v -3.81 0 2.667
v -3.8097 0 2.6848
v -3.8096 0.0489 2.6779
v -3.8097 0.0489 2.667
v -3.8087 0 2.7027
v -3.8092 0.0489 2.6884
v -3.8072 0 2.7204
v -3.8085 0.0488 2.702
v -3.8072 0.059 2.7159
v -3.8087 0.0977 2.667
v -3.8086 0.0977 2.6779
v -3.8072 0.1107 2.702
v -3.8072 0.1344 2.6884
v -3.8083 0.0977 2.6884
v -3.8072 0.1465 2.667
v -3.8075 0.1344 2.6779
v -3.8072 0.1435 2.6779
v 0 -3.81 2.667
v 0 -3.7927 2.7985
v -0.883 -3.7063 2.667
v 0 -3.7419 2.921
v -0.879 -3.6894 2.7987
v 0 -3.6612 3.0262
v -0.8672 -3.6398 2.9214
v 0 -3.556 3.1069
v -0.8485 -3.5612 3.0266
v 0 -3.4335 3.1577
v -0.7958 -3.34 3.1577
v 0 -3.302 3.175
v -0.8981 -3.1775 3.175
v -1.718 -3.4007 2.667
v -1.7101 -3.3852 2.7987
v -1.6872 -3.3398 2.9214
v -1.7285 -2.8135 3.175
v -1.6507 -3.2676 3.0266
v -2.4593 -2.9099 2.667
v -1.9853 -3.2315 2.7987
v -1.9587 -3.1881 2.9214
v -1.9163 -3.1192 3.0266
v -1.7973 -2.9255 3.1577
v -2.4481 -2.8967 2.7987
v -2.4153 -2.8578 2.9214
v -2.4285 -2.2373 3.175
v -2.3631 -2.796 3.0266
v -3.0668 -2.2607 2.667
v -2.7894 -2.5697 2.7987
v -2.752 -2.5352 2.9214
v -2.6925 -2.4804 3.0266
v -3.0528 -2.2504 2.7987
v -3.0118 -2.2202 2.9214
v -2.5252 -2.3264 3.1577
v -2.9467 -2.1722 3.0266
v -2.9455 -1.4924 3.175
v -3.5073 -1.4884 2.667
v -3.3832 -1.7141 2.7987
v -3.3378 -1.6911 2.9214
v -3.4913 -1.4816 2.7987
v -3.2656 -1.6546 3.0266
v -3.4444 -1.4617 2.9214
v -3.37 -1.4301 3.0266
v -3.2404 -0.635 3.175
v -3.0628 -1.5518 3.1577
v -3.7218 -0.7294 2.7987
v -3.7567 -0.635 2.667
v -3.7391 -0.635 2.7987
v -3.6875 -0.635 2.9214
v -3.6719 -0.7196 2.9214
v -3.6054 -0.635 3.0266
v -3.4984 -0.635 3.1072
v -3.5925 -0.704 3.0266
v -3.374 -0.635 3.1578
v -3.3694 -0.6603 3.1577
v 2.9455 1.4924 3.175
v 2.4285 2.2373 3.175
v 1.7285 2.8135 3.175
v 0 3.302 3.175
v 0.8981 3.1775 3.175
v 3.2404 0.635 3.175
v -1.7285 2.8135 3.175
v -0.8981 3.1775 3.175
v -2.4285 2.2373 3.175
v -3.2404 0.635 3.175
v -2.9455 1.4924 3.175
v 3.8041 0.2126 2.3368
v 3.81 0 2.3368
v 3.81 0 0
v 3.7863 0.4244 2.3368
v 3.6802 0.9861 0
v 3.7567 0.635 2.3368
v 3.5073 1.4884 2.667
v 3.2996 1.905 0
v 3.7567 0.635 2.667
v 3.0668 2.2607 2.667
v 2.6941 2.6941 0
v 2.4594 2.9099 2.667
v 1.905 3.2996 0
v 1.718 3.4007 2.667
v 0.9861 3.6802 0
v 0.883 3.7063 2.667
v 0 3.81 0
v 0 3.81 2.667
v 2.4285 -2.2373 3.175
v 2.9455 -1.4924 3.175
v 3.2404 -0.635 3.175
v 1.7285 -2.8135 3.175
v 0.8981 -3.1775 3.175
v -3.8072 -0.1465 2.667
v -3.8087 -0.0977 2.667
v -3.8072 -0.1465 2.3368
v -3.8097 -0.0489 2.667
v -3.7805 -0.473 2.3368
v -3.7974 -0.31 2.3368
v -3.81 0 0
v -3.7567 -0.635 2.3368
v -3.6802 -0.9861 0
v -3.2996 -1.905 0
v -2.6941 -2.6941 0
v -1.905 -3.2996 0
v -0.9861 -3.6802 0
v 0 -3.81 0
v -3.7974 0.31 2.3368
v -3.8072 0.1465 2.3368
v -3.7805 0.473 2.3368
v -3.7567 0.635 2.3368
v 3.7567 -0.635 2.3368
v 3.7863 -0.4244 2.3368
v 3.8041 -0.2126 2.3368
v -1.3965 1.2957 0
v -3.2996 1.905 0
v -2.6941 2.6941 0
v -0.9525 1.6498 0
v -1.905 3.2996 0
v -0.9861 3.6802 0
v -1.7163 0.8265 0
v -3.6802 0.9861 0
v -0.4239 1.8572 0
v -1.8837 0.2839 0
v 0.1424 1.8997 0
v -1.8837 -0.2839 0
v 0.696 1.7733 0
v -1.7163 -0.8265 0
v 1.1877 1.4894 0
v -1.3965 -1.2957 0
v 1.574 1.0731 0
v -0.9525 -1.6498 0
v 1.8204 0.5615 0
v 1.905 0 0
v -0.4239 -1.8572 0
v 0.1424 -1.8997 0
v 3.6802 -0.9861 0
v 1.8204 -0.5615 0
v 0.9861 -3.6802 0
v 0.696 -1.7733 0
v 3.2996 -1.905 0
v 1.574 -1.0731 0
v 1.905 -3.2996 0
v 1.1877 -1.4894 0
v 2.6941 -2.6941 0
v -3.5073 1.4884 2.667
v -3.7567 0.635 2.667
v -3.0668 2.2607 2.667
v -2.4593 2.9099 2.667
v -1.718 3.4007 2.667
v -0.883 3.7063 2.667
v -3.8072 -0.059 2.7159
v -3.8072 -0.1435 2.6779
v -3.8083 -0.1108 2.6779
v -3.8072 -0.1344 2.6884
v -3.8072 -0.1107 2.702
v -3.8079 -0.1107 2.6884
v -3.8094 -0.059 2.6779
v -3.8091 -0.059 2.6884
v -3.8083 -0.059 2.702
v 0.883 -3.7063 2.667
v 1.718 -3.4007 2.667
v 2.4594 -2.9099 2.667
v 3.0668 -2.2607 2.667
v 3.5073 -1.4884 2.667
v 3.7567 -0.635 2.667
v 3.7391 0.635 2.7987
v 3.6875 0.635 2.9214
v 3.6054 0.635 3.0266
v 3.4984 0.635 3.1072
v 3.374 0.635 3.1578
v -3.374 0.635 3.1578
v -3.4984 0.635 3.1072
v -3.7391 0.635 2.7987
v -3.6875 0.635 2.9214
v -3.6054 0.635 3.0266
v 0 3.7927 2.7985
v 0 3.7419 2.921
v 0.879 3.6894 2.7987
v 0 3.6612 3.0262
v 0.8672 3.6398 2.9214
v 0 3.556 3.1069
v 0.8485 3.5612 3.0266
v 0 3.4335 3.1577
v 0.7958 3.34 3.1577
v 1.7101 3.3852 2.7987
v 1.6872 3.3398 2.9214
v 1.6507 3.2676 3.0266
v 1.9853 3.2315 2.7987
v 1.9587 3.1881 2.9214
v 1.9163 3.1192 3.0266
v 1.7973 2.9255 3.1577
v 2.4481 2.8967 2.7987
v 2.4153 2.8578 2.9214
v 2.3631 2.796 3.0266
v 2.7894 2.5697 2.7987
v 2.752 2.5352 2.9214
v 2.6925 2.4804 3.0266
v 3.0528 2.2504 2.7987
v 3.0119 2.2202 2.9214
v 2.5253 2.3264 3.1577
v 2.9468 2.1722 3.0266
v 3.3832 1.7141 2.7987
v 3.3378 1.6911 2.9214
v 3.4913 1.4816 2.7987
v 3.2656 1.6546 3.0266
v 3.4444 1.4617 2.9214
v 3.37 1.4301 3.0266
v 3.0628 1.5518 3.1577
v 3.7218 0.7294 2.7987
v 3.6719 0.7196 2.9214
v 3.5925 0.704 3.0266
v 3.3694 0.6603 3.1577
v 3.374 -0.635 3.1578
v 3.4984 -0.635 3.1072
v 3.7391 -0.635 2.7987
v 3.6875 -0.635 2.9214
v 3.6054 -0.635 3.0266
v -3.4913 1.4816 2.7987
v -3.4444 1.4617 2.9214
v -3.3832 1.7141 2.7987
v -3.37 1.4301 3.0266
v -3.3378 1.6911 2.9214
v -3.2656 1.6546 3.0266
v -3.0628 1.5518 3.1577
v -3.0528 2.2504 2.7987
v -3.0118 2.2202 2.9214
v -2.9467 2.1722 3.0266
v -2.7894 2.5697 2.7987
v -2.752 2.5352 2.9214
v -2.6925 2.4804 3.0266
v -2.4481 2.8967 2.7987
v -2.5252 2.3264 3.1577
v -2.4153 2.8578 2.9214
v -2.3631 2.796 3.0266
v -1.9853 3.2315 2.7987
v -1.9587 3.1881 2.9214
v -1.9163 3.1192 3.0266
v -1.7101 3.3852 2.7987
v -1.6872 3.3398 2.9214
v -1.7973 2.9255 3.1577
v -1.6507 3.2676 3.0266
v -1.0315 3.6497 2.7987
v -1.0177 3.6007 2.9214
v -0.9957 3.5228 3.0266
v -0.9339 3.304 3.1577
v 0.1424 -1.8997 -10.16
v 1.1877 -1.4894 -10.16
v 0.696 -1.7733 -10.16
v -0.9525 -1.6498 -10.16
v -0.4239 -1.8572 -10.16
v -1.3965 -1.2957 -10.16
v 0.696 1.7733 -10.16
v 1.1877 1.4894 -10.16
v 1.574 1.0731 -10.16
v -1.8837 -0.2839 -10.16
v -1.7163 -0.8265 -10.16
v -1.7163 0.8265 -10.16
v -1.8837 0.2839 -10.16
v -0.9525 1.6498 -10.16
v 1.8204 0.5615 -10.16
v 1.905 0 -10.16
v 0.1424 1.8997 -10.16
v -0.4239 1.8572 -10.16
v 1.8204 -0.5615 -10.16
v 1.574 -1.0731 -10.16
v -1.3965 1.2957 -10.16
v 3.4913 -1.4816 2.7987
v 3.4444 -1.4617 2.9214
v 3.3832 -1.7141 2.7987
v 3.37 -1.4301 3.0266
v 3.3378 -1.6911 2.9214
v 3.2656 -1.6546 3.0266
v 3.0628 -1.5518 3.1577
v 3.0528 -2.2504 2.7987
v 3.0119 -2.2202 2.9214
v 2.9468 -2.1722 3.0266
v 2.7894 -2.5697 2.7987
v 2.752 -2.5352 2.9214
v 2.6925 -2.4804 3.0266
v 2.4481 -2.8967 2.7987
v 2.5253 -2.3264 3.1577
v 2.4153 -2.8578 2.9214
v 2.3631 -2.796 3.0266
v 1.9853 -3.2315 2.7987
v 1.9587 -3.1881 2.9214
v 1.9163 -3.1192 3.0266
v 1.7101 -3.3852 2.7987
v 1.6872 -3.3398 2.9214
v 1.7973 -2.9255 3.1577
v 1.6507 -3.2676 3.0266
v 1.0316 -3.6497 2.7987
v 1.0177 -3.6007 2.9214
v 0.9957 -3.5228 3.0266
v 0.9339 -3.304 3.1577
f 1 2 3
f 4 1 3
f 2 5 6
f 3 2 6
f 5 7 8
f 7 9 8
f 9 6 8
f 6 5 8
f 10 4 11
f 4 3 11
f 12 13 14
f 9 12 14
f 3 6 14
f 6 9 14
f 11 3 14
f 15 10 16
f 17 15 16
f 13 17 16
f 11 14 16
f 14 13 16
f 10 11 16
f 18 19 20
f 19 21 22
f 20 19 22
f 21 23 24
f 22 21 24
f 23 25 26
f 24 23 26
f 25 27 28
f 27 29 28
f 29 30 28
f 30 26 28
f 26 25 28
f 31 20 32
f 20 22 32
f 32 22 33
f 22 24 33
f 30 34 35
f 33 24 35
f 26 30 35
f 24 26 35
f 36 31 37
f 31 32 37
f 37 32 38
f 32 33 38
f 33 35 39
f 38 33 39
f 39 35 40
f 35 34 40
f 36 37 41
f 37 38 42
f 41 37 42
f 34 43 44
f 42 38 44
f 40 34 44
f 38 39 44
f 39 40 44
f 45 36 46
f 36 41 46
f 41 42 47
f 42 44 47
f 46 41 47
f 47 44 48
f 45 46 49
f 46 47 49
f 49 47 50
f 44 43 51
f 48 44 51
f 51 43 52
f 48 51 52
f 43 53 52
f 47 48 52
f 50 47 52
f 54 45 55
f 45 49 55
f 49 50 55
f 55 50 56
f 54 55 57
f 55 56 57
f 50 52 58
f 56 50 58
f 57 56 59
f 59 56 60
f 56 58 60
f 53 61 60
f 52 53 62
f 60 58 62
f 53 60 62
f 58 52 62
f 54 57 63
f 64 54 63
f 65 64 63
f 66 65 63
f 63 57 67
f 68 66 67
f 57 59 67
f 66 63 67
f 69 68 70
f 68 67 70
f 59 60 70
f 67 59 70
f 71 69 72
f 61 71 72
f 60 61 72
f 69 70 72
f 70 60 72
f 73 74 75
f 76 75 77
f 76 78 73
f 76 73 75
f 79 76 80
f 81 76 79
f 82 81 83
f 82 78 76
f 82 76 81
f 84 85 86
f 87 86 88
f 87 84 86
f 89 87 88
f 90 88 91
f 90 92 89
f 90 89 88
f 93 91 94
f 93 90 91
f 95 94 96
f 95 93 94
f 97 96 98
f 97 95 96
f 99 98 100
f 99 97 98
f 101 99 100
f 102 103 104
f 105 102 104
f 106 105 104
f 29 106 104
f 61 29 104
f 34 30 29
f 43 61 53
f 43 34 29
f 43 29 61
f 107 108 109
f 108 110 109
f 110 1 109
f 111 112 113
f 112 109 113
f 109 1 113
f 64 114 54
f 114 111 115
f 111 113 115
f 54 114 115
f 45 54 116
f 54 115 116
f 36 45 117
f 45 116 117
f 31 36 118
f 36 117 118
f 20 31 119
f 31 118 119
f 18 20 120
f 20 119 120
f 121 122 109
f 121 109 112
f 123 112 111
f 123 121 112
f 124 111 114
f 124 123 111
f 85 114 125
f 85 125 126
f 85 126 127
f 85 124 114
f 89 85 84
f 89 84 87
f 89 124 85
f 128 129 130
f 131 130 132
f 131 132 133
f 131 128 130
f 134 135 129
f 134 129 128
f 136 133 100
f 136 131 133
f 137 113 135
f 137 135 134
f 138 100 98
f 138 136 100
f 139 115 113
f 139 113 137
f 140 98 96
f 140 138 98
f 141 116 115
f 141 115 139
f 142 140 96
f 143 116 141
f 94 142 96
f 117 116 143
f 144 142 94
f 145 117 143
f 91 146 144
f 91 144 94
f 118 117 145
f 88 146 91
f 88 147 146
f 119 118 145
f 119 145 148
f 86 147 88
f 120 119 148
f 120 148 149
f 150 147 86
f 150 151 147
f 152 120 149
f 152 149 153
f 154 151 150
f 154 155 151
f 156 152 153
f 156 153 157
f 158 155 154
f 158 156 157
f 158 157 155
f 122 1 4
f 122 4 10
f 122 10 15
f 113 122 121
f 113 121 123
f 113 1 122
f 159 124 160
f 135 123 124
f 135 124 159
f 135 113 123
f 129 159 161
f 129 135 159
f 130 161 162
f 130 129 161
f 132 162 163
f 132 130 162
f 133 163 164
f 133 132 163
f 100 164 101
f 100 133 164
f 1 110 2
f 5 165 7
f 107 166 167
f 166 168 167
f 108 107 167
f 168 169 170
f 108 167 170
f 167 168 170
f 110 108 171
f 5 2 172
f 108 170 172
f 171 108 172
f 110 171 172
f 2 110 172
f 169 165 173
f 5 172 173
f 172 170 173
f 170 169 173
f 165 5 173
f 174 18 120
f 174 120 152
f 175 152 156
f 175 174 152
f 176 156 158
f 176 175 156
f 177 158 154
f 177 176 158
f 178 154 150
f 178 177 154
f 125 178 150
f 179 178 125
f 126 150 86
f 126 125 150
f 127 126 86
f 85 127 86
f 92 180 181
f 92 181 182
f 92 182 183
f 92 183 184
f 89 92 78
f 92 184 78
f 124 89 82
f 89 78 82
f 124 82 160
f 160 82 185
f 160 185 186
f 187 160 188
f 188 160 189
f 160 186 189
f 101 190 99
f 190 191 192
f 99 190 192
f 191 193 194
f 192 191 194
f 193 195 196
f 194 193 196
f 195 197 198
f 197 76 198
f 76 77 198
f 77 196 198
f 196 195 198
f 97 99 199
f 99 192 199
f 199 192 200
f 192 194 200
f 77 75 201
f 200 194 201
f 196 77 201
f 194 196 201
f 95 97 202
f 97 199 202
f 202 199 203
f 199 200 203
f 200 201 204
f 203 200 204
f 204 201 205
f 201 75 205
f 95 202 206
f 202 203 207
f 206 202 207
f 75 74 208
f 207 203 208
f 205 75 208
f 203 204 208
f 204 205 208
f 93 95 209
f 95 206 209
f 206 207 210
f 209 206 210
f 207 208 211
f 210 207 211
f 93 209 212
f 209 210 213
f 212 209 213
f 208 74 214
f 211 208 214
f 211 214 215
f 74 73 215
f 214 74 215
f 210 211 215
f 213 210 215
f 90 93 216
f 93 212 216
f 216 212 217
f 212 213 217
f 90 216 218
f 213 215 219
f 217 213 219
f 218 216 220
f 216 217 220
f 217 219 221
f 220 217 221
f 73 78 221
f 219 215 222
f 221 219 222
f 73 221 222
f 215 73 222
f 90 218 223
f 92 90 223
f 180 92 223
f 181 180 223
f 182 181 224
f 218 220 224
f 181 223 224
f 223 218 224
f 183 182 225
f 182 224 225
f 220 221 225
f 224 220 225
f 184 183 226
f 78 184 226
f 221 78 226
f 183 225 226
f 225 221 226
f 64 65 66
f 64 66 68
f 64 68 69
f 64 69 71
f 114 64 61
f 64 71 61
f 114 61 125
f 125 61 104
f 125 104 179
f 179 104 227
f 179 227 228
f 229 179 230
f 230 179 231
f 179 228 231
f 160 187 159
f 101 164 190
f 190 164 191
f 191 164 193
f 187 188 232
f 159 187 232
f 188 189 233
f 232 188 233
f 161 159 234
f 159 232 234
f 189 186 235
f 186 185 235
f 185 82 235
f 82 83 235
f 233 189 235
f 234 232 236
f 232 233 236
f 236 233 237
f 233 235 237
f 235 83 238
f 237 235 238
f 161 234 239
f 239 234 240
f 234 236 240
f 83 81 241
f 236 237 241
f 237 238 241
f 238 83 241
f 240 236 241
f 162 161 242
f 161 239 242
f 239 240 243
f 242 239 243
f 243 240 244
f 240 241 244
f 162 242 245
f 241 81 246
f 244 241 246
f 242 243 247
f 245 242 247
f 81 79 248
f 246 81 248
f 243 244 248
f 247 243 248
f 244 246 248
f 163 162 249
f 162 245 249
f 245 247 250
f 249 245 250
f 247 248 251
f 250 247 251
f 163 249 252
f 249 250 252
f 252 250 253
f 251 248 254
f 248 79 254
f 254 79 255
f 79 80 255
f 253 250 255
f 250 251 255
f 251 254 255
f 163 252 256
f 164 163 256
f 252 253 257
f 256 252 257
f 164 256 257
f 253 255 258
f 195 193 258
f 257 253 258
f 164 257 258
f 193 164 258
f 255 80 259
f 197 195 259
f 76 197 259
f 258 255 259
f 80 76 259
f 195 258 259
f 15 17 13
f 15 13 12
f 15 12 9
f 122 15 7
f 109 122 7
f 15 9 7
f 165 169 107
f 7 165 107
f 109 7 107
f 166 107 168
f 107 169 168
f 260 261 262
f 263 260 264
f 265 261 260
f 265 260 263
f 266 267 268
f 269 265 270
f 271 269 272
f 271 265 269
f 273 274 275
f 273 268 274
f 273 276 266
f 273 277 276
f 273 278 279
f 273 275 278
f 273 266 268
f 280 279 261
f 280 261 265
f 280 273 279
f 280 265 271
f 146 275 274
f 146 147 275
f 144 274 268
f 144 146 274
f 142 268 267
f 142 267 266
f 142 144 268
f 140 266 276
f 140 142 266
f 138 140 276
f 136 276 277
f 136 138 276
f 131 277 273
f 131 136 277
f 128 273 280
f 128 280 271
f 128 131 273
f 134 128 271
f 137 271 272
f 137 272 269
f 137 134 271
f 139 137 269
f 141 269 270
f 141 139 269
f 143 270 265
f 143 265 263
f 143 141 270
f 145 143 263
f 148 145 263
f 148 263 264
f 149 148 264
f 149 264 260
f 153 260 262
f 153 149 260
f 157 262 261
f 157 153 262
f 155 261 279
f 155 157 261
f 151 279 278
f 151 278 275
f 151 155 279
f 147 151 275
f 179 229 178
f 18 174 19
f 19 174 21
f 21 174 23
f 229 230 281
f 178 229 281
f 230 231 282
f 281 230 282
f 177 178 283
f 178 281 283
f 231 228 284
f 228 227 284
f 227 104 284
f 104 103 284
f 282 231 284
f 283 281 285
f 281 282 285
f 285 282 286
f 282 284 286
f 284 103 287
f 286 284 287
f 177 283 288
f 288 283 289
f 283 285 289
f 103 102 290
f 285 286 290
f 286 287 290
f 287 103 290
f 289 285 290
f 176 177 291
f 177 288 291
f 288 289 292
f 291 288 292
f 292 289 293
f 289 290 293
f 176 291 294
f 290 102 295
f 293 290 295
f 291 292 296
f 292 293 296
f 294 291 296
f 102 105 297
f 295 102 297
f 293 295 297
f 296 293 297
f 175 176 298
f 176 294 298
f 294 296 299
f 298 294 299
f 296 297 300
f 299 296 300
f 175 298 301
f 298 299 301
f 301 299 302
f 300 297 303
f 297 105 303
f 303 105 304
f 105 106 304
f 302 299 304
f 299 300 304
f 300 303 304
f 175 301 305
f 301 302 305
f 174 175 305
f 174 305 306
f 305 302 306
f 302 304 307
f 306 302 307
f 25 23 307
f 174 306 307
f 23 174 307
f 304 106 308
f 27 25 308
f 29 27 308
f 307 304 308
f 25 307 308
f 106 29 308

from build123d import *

# Parameters (mm, degrees)
F1_DEPTH    = 3.81
F2_T1_DEPTH = 22.225
F3_R        = 3.80999
F0_W        = 1.905
F0_H        = 10.16
F5_R        = 0.508
F7_DEPTH    = 0.8382


# Not quite as in the source:
# - a fillet or chamfer that OpenCascade refuses, or shapes differently, is made with other operations: its cross-section is extruded or revolved along the edge and cut away or added
# - a fillet or chamfer is up to 0.001 mm smaller than in the source, because OpenCascade refuses the exact size
# - ends of sketch curves that miss each other by under 0.0002 mm in the source are joined
# - a feature names something its author has since deleted; it is built from what else it names


with BuildPart() as f1:
    # F0 (on Front) → F1 (new body, symmetric)
    with BuildSketch(Plane.XZ):
        Polygon((-3.81, 3.175), (-3.81, 0), (-1.905, 0), (0, 0), (1.905, 0), (3.81, 0), (3.81, 3.175), align=None)
    extrude(amount=F1_DEPTH, both=True)

    # F2: fillet of radius 3.81 on 2 edges, made by hand

    # F2_s2 → F2_t1 (cut)
    with BuildSketch(Plane.XY.offset(-9.525)):
        with BuildLine():
            ThreePointArc((-3.81, 0), (-2.6940768363, -2.6940768363), (0, -3.81))
            Line((0, -3.81), (-3.81, -3.81))
            Line((-3.81, -3.81), (-3.81, 0))
        make_face()
        with BuildLine():
            ThreePointArc((-3.81, 0), (-2.6940768363, 2.6940768363), (0, 3.81))
            Line((0, 3.81), (-3.81, 3.81))
            Line((-3.81, 3.81), (-3.81, 0))
        make_face()
    extrude(amount=F2_T1_DEPTH, mode=Mode.SUBTRACT)

    # F3 (radius 3.81 in the source; OpenCascade refuses exactly that, so slightly less here)
    f3_edges = [f1.edges().sort_by_distance(p)[0] for p in [
        (3.81, -3.81, 1.5875),
        (3.81, 3.81, 1.5875),
    ]]
    fillet(f3_edges, radius=F3_R)

    # F0 (on Front) → F4 (revolve)
    with BuildSketch(Plane.XZ):
        with Locations((0.9525, -5.08)):
            Rectangle(F0_W, F0_H)
    revolve(axis=Axis((0, 0, -5.08), (0, 0, 1)))

    # F5
    f5_edges = [f1.edges().sort_by_distance(p)[0] for p in [
        (-2.694077, -2.694077, 3.175),
        (2.69408, -2.69408, 3.175),
        (5e-06, -3.81, 3.175),
        (-2.694077, 2.694077, 3.175),
        (2.69408, 2.69408, 3.175),
        (5e-06, 3.81, 3.175),
    ]]
    fillet(f5_edges, radius=F5_R)

    # F6 (on face) → F7 (cut)
    with BuildSketch(Plane.XY.offset(3.175)):
        with BuildLine():
            Line((-3.2403671088, 0.635), (-3.8071805373, 0.635))
            Line((-3.8071805373, 0.635), (-3.8071805373, -0.635))
            Line((-3.8071805373, -0.635), (-3.2403671088, -0.635))
            ThreePointArc((-3.2403671088, -0.635), (-3.2865556585, -0.3189920114), (-3.302, 0))
            ThreePointArc((-3.302, 0), (-3.2865556585, 0.3189920114), (-3.2403671088, 0.635))
        make_face()
        with BuildLine():
            Line((3.2403688783, 0.635), (-3.2403671088, 0.635))
            ThreePointArc((-3.2403671088, 0.635), (-3.2865556585, 0.3189920114), (-3.302, 0))
            ThreePointArc((-3.302, 0), (-3.2865556585, -0.3189920114), (-3.2403671088, -0.635))
            Line((-3.2403671088, -0.635), (3.2403688783, -0.635))
            ThreePointArc((3.2403688783, -0.635), (3.2865561029, -0.3189969493), (3.302, -1e-05))
            ThreePointArc((3.302, -1e-05), (3.2865561029, 0.3189969493), (3.2403688783, 0.635))
        make_face()
        with BuildLine():
            Line((3.8128194627, 0.635), (3.2403688783, 0.635))
            ThreePointArc((3.2403688783, 0.635), (3.2865561029, 0.3189969493), (3.302, 1e-05))
            ThreePointArc((3.302, 1e-05), (3.2865561029, -0.3189969493), (3.2403688783, -0.635))
            Line((3.2403688783, -0.635), (3.8128194627, -0.635))
            Line((3.8128194627, -0.635), (3.8128194627, 0.635))
        make_face()
    extrude(amount=-F7_DEPTH, mode=Mode.SUBTRACT)


solid = f1.part
